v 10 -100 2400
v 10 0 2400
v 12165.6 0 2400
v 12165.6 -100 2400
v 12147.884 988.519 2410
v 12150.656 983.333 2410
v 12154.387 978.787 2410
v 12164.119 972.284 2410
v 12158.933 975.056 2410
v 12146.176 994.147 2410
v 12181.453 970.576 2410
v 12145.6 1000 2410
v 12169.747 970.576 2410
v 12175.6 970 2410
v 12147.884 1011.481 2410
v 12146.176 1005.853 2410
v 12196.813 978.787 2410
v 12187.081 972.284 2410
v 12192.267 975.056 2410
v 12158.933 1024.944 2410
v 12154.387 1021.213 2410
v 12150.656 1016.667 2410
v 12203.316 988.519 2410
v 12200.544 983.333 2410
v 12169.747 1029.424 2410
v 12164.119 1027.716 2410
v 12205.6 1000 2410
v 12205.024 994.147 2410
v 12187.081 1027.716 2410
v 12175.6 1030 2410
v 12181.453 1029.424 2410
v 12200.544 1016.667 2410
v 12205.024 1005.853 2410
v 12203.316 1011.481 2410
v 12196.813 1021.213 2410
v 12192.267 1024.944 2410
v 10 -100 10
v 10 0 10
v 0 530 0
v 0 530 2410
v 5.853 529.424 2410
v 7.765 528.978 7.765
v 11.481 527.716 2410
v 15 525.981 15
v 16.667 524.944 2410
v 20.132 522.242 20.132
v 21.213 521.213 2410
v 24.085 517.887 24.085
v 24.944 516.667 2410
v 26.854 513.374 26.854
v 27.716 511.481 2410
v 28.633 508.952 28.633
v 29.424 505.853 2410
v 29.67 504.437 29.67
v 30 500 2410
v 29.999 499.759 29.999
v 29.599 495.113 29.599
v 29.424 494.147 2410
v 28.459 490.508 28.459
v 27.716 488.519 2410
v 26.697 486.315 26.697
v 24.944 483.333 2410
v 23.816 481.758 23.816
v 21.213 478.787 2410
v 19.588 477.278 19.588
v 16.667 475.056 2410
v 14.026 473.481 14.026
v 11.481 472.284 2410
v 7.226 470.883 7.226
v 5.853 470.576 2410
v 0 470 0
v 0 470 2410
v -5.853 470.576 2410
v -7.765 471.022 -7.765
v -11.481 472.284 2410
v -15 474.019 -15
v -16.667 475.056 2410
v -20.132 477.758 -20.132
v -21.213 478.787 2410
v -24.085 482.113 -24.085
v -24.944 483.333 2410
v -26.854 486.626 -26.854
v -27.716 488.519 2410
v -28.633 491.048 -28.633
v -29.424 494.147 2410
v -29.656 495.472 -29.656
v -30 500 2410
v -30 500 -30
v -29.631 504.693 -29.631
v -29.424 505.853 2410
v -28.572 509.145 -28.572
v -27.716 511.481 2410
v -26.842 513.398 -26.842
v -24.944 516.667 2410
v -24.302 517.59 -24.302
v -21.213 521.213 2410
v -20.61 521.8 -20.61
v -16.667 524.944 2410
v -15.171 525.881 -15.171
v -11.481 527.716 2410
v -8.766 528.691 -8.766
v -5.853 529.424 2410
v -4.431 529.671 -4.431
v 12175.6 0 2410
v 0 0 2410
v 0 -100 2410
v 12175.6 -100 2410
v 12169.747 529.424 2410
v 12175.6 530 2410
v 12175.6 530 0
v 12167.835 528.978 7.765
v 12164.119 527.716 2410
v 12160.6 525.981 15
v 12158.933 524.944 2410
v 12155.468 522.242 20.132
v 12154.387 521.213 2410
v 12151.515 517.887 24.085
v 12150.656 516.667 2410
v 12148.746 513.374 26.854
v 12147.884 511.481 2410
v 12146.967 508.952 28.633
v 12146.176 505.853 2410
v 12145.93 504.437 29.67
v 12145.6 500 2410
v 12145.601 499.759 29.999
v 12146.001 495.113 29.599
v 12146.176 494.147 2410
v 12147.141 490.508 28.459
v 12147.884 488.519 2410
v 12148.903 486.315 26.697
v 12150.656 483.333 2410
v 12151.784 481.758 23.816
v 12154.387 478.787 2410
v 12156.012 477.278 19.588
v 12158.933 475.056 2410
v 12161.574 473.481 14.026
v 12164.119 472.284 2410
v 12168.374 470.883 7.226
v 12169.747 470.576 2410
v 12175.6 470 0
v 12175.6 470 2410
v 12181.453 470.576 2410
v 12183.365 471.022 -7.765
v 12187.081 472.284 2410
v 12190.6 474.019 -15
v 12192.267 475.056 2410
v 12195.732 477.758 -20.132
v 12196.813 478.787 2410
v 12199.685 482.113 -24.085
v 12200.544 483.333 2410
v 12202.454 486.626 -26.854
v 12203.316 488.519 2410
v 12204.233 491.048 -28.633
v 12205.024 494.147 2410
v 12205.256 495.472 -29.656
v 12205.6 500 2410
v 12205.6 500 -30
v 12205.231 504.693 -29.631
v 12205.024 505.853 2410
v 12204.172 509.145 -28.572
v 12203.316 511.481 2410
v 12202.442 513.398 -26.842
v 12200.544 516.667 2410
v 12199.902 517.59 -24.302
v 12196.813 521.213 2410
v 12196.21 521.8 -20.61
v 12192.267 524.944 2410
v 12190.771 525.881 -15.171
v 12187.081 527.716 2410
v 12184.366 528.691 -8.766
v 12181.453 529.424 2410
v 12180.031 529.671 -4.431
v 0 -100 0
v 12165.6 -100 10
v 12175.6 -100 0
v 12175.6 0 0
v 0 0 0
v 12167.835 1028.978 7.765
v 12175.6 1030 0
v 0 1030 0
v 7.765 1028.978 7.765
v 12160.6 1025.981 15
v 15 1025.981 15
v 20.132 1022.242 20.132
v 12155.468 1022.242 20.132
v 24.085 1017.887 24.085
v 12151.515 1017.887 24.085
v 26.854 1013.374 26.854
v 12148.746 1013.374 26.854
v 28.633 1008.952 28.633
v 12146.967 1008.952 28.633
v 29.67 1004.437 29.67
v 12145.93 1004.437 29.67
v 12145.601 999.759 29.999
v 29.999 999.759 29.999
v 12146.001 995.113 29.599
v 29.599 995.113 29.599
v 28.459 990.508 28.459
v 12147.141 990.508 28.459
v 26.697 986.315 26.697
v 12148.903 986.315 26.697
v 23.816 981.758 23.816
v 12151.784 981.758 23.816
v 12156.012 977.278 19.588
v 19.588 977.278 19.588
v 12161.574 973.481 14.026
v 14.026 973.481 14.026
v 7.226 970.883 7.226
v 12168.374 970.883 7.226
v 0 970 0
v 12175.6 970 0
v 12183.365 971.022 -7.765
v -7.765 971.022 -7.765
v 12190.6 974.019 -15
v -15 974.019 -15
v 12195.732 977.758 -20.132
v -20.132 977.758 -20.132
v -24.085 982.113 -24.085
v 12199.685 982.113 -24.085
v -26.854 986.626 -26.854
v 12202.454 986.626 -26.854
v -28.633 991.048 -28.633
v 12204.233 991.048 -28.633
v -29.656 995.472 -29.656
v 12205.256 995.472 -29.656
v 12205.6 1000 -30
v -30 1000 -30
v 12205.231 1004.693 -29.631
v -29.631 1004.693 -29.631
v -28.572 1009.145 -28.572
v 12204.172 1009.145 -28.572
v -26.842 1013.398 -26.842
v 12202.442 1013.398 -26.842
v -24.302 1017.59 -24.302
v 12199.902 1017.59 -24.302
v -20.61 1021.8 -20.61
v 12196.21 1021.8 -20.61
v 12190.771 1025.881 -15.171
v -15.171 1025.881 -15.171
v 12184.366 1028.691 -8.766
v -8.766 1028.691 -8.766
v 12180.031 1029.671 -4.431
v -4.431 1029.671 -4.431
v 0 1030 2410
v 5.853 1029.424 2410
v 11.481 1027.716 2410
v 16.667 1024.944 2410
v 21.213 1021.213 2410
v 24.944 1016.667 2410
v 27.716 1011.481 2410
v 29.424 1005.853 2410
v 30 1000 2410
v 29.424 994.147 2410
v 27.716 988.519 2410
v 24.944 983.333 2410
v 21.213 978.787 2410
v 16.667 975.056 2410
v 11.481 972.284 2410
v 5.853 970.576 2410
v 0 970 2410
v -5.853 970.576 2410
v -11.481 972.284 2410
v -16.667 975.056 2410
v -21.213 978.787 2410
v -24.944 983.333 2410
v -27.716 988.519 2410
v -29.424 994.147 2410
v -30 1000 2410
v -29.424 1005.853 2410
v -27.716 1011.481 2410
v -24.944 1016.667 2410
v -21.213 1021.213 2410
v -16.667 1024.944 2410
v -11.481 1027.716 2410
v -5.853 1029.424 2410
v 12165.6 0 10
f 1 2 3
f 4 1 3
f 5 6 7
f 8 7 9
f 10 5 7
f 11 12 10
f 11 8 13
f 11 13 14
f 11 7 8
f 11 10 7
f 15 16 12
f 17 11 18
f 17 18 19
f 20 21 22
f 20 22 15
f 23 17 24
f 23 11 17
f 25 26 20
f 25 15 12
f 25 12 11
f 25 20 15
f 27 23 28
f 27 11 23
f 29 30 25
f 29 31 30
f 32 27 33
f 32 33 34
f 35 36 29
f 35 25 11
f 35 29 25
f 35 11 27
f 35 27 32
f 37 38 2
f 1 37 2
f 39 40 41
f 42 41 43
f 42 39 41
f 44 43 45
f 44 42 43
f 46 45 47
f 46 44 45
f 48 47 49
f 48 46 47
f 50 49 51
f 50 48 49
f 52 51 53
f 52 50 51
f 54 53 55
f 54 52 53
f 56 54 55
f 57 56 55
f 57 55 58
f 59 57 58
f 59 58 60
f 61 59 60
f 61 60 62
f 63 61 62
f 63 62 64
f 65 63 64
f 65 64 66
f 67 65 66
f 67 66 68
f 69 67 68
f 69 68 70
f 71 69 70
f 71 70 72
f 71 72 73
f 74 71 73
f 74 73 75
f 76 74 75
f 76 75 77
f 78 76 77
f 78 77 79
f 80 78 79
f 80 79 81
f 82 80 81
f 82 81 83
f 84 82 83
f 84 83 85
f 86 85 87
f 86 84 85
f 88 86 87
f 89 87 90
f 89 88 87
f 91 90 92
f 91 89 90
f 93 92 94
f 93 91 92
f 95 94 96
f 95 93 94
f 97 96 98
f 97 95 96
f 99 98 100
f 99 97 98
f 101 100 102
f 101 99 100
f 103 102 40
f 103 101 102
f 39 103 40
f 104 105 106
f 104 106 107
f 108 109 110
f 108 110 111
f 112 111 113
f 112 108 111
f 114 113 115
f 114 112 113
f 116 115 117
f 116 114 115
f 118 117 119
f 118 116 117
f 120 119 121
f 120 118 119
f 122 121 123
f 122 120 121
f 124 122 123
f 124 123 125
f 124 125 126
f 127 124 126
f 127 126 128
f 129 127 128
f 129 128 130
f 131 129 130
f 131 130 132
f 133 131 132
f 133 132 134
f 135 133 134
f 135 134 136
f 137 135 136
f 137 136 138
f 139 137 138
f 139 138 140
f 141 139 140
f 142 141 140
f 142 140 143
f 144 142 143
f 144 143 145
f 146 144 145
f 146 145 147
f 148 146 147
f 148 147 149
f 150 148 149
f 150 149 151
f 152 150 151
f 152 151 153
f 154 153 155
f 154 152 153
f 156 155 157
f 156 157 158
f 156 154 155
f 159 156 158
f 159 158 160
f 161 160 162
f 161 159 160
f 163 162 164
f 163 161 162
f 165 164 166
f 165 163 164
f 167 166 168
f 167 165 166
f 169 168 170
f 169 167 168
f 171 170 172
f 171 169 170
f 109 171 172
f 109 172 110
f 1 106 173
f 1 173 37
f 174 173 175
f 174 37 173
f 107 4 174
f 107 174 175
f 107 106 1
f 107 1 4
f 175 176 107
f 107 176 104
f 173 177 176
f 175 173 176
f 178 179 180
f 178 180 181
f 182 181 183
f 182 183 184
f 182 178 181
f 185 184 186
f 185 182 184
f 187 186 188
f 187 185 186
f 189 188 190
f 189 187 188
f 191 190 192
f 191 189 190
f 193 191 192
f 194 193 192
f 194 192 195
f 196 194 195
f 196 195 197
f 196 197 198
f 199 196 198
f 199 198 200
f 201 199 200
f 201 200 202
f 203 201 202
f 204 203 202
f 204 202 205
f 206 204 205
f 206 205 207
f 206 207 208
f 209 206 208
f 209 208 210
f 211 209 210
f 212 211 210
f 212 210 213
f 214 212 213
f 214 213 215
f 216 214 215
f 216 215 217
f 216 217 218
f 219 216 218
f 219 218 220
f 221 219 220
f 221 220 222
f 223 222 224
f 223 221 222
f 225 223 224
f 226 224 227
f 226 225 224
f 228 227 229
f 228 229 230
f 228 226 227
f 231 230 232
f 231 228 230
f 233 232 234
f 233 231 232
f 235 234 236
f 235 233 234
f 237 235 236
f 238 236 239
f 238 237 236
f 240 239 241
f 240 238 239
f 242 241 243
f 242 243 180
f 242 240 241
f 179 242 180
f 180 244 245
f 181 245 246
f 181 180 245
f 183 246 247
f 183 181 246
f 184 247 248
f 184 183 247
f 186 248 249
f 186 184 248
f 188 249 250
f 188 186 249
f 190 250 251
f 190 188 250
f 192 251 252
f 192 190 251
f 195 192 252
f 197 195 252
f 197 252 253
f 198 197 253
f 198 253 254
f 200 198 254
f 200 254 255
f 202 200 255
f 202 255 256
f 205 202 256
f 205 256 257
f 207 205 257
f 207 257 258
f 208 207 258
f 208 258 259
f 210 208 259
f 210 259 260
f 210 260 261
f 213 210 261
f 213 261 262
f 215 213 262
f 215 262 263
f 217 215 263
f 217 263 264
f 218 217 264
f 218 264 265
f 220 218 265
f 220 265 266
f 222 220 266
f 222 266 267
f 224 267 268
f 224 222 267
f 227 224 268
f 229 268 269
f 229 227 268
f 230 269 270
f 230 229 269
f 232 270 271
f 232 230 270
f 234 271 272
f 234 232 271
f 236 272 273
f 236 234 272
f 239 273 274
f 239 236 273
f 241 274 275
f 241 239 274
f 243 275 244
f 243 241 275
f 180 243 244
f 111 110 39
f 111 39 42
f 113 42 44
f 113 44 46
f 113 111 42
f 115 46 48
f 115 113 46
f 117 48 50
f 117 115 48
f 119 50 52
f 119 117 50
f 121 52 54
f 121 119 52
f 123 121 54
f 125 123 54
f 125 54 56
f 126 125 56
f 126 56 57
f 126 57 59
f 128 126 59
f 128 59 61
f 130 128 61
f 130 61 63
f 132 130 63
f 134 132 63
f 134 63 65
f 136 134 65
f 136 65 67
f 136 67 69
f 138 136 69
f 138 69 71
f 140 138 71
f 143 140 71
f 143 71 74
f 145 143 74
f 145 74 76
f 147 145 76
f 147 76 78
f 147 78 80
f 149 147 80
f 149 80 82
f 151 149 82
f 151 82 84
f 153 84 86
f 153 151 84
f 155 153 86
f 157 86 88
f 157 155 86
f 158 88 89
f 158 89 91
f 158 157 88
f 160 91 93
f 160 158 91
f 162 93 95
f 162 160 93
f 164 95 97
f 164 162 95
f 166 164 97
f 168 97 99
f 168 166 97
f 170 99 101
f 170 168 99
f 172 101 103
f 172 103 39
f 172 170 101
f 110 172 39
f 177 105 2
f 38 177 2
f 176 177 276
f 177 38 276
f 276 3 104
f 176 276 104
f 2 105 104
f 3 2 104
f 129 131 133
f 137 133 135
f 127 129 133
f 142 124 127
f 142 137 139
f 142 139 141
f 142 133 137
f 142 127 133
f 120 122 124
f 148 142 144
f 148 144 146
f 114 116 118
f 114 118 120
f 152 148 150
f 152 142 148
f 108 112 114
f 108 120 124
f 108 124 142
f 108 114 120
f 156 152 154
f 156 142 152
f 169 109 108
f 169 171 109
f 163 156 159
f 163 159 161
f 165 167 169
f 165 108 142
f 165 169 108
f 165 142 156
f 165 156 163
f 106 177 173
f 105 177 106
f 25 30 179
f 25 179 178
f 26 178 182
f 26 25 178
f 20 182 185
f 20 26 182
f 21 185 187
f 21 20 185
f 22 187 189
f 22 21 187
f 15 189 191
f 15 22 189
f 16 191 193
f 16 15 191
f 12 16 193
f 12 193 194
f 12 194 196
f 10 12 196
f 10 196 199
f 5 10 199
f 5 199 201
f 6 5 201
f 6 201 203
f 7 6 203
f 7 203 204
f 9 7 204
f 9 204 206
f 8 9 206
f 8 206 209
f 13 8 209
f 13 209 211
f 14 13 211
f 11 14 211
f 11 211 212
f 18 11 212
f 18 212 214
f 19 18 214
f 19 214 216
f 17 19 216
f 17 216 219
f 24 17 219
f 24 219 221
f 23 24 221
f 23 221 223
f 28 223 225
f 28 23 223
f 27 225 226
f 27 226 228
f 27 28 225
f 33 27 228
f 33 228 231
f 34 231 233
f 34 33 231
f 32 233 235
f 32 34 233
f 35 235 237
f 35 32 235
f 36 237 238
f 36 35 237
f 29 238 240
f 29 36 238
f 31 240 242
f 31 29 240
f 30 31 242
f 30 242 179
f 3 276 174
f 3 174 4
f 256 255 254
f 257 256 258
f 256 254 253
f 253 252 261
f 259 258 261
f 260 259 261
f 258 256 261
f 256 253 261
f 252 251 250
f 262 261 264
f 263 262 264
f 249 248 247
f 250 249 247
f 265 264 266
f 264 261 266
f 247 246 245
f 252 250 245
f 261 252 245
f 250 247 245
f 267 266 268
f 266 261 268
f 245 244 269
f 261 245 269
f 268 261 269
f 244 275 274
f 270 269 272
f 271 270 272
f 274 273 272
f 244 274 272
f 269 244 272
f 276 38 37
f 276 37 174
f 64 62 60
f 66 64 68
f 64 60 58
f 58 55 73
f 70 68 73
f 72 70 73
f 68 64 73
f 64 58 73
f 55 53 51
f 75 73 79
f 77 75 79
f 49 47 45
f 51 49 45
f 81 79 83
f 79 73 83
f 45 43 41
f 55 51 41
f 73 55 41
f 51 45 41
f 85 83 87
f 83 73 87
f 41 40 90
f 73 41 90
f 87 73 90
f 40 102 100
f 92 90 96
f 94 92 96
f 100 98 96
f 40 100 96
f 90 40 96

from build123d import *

# Parameters (mm, degrees)
F0_W     = 12175.6
F0_H     = 2410
F0_W_2   = 12155.6
F0_H_2   = 2390
F1_DEPTH = 100
F2_R     = 30


with BuildPart() as f1:
    # F0 (on Front) → F1 (new body)
    with BuildSketch(Plane.XZ):
        with Locations((6087.8, 1205)):
            Rectangle(F0_W, F0_H)
        with Locations((6087.8, 1205)):
            Rectangle(F0_W_2, F0_H_2, mode=Mode.SUBTRACT)
    extrude(amount=F1_DEPTH)


with BuildPart() as f6:
    # F6: sweep along a path in F5
    with BuildLine(Plane.XZ.offset(-500)) as f6_path:
        Line((0, 2410), (0, 0))
        Line((0, 0), (12175.6, 0))
        Line((12175.6, 0), (12175.6, 2410))
    # F2 (on Right) → F6 (sweep)
    with BuildSketch(Plane.YZ):
        with Locations((500, 0)):
            Circle(F2_R)
    sweep(path=f6_path.line, transition=Transition.RIGHT)


with BuildPart() as f8:
    # F8: sweep along a path in F7
    with BuildLine(Plane.XZ.offset(-1000)) as f8_path:
        Line((0, 2410), (0, 0))
        Line((0, 0), (12175.6, 0))
        Line((12175.6, 0), (12175.6, 2410))
    # F2 (on Right) → F8 (sweep)
    with BuildSketch(Plane.YZ):
        with Locations((1000, 0)):
            Circle(F2_R)
    sweep(path=f8_path.line, transition=Transition.RIGHT)


solid = Compound([f1.part, f6.part, f8.part])
